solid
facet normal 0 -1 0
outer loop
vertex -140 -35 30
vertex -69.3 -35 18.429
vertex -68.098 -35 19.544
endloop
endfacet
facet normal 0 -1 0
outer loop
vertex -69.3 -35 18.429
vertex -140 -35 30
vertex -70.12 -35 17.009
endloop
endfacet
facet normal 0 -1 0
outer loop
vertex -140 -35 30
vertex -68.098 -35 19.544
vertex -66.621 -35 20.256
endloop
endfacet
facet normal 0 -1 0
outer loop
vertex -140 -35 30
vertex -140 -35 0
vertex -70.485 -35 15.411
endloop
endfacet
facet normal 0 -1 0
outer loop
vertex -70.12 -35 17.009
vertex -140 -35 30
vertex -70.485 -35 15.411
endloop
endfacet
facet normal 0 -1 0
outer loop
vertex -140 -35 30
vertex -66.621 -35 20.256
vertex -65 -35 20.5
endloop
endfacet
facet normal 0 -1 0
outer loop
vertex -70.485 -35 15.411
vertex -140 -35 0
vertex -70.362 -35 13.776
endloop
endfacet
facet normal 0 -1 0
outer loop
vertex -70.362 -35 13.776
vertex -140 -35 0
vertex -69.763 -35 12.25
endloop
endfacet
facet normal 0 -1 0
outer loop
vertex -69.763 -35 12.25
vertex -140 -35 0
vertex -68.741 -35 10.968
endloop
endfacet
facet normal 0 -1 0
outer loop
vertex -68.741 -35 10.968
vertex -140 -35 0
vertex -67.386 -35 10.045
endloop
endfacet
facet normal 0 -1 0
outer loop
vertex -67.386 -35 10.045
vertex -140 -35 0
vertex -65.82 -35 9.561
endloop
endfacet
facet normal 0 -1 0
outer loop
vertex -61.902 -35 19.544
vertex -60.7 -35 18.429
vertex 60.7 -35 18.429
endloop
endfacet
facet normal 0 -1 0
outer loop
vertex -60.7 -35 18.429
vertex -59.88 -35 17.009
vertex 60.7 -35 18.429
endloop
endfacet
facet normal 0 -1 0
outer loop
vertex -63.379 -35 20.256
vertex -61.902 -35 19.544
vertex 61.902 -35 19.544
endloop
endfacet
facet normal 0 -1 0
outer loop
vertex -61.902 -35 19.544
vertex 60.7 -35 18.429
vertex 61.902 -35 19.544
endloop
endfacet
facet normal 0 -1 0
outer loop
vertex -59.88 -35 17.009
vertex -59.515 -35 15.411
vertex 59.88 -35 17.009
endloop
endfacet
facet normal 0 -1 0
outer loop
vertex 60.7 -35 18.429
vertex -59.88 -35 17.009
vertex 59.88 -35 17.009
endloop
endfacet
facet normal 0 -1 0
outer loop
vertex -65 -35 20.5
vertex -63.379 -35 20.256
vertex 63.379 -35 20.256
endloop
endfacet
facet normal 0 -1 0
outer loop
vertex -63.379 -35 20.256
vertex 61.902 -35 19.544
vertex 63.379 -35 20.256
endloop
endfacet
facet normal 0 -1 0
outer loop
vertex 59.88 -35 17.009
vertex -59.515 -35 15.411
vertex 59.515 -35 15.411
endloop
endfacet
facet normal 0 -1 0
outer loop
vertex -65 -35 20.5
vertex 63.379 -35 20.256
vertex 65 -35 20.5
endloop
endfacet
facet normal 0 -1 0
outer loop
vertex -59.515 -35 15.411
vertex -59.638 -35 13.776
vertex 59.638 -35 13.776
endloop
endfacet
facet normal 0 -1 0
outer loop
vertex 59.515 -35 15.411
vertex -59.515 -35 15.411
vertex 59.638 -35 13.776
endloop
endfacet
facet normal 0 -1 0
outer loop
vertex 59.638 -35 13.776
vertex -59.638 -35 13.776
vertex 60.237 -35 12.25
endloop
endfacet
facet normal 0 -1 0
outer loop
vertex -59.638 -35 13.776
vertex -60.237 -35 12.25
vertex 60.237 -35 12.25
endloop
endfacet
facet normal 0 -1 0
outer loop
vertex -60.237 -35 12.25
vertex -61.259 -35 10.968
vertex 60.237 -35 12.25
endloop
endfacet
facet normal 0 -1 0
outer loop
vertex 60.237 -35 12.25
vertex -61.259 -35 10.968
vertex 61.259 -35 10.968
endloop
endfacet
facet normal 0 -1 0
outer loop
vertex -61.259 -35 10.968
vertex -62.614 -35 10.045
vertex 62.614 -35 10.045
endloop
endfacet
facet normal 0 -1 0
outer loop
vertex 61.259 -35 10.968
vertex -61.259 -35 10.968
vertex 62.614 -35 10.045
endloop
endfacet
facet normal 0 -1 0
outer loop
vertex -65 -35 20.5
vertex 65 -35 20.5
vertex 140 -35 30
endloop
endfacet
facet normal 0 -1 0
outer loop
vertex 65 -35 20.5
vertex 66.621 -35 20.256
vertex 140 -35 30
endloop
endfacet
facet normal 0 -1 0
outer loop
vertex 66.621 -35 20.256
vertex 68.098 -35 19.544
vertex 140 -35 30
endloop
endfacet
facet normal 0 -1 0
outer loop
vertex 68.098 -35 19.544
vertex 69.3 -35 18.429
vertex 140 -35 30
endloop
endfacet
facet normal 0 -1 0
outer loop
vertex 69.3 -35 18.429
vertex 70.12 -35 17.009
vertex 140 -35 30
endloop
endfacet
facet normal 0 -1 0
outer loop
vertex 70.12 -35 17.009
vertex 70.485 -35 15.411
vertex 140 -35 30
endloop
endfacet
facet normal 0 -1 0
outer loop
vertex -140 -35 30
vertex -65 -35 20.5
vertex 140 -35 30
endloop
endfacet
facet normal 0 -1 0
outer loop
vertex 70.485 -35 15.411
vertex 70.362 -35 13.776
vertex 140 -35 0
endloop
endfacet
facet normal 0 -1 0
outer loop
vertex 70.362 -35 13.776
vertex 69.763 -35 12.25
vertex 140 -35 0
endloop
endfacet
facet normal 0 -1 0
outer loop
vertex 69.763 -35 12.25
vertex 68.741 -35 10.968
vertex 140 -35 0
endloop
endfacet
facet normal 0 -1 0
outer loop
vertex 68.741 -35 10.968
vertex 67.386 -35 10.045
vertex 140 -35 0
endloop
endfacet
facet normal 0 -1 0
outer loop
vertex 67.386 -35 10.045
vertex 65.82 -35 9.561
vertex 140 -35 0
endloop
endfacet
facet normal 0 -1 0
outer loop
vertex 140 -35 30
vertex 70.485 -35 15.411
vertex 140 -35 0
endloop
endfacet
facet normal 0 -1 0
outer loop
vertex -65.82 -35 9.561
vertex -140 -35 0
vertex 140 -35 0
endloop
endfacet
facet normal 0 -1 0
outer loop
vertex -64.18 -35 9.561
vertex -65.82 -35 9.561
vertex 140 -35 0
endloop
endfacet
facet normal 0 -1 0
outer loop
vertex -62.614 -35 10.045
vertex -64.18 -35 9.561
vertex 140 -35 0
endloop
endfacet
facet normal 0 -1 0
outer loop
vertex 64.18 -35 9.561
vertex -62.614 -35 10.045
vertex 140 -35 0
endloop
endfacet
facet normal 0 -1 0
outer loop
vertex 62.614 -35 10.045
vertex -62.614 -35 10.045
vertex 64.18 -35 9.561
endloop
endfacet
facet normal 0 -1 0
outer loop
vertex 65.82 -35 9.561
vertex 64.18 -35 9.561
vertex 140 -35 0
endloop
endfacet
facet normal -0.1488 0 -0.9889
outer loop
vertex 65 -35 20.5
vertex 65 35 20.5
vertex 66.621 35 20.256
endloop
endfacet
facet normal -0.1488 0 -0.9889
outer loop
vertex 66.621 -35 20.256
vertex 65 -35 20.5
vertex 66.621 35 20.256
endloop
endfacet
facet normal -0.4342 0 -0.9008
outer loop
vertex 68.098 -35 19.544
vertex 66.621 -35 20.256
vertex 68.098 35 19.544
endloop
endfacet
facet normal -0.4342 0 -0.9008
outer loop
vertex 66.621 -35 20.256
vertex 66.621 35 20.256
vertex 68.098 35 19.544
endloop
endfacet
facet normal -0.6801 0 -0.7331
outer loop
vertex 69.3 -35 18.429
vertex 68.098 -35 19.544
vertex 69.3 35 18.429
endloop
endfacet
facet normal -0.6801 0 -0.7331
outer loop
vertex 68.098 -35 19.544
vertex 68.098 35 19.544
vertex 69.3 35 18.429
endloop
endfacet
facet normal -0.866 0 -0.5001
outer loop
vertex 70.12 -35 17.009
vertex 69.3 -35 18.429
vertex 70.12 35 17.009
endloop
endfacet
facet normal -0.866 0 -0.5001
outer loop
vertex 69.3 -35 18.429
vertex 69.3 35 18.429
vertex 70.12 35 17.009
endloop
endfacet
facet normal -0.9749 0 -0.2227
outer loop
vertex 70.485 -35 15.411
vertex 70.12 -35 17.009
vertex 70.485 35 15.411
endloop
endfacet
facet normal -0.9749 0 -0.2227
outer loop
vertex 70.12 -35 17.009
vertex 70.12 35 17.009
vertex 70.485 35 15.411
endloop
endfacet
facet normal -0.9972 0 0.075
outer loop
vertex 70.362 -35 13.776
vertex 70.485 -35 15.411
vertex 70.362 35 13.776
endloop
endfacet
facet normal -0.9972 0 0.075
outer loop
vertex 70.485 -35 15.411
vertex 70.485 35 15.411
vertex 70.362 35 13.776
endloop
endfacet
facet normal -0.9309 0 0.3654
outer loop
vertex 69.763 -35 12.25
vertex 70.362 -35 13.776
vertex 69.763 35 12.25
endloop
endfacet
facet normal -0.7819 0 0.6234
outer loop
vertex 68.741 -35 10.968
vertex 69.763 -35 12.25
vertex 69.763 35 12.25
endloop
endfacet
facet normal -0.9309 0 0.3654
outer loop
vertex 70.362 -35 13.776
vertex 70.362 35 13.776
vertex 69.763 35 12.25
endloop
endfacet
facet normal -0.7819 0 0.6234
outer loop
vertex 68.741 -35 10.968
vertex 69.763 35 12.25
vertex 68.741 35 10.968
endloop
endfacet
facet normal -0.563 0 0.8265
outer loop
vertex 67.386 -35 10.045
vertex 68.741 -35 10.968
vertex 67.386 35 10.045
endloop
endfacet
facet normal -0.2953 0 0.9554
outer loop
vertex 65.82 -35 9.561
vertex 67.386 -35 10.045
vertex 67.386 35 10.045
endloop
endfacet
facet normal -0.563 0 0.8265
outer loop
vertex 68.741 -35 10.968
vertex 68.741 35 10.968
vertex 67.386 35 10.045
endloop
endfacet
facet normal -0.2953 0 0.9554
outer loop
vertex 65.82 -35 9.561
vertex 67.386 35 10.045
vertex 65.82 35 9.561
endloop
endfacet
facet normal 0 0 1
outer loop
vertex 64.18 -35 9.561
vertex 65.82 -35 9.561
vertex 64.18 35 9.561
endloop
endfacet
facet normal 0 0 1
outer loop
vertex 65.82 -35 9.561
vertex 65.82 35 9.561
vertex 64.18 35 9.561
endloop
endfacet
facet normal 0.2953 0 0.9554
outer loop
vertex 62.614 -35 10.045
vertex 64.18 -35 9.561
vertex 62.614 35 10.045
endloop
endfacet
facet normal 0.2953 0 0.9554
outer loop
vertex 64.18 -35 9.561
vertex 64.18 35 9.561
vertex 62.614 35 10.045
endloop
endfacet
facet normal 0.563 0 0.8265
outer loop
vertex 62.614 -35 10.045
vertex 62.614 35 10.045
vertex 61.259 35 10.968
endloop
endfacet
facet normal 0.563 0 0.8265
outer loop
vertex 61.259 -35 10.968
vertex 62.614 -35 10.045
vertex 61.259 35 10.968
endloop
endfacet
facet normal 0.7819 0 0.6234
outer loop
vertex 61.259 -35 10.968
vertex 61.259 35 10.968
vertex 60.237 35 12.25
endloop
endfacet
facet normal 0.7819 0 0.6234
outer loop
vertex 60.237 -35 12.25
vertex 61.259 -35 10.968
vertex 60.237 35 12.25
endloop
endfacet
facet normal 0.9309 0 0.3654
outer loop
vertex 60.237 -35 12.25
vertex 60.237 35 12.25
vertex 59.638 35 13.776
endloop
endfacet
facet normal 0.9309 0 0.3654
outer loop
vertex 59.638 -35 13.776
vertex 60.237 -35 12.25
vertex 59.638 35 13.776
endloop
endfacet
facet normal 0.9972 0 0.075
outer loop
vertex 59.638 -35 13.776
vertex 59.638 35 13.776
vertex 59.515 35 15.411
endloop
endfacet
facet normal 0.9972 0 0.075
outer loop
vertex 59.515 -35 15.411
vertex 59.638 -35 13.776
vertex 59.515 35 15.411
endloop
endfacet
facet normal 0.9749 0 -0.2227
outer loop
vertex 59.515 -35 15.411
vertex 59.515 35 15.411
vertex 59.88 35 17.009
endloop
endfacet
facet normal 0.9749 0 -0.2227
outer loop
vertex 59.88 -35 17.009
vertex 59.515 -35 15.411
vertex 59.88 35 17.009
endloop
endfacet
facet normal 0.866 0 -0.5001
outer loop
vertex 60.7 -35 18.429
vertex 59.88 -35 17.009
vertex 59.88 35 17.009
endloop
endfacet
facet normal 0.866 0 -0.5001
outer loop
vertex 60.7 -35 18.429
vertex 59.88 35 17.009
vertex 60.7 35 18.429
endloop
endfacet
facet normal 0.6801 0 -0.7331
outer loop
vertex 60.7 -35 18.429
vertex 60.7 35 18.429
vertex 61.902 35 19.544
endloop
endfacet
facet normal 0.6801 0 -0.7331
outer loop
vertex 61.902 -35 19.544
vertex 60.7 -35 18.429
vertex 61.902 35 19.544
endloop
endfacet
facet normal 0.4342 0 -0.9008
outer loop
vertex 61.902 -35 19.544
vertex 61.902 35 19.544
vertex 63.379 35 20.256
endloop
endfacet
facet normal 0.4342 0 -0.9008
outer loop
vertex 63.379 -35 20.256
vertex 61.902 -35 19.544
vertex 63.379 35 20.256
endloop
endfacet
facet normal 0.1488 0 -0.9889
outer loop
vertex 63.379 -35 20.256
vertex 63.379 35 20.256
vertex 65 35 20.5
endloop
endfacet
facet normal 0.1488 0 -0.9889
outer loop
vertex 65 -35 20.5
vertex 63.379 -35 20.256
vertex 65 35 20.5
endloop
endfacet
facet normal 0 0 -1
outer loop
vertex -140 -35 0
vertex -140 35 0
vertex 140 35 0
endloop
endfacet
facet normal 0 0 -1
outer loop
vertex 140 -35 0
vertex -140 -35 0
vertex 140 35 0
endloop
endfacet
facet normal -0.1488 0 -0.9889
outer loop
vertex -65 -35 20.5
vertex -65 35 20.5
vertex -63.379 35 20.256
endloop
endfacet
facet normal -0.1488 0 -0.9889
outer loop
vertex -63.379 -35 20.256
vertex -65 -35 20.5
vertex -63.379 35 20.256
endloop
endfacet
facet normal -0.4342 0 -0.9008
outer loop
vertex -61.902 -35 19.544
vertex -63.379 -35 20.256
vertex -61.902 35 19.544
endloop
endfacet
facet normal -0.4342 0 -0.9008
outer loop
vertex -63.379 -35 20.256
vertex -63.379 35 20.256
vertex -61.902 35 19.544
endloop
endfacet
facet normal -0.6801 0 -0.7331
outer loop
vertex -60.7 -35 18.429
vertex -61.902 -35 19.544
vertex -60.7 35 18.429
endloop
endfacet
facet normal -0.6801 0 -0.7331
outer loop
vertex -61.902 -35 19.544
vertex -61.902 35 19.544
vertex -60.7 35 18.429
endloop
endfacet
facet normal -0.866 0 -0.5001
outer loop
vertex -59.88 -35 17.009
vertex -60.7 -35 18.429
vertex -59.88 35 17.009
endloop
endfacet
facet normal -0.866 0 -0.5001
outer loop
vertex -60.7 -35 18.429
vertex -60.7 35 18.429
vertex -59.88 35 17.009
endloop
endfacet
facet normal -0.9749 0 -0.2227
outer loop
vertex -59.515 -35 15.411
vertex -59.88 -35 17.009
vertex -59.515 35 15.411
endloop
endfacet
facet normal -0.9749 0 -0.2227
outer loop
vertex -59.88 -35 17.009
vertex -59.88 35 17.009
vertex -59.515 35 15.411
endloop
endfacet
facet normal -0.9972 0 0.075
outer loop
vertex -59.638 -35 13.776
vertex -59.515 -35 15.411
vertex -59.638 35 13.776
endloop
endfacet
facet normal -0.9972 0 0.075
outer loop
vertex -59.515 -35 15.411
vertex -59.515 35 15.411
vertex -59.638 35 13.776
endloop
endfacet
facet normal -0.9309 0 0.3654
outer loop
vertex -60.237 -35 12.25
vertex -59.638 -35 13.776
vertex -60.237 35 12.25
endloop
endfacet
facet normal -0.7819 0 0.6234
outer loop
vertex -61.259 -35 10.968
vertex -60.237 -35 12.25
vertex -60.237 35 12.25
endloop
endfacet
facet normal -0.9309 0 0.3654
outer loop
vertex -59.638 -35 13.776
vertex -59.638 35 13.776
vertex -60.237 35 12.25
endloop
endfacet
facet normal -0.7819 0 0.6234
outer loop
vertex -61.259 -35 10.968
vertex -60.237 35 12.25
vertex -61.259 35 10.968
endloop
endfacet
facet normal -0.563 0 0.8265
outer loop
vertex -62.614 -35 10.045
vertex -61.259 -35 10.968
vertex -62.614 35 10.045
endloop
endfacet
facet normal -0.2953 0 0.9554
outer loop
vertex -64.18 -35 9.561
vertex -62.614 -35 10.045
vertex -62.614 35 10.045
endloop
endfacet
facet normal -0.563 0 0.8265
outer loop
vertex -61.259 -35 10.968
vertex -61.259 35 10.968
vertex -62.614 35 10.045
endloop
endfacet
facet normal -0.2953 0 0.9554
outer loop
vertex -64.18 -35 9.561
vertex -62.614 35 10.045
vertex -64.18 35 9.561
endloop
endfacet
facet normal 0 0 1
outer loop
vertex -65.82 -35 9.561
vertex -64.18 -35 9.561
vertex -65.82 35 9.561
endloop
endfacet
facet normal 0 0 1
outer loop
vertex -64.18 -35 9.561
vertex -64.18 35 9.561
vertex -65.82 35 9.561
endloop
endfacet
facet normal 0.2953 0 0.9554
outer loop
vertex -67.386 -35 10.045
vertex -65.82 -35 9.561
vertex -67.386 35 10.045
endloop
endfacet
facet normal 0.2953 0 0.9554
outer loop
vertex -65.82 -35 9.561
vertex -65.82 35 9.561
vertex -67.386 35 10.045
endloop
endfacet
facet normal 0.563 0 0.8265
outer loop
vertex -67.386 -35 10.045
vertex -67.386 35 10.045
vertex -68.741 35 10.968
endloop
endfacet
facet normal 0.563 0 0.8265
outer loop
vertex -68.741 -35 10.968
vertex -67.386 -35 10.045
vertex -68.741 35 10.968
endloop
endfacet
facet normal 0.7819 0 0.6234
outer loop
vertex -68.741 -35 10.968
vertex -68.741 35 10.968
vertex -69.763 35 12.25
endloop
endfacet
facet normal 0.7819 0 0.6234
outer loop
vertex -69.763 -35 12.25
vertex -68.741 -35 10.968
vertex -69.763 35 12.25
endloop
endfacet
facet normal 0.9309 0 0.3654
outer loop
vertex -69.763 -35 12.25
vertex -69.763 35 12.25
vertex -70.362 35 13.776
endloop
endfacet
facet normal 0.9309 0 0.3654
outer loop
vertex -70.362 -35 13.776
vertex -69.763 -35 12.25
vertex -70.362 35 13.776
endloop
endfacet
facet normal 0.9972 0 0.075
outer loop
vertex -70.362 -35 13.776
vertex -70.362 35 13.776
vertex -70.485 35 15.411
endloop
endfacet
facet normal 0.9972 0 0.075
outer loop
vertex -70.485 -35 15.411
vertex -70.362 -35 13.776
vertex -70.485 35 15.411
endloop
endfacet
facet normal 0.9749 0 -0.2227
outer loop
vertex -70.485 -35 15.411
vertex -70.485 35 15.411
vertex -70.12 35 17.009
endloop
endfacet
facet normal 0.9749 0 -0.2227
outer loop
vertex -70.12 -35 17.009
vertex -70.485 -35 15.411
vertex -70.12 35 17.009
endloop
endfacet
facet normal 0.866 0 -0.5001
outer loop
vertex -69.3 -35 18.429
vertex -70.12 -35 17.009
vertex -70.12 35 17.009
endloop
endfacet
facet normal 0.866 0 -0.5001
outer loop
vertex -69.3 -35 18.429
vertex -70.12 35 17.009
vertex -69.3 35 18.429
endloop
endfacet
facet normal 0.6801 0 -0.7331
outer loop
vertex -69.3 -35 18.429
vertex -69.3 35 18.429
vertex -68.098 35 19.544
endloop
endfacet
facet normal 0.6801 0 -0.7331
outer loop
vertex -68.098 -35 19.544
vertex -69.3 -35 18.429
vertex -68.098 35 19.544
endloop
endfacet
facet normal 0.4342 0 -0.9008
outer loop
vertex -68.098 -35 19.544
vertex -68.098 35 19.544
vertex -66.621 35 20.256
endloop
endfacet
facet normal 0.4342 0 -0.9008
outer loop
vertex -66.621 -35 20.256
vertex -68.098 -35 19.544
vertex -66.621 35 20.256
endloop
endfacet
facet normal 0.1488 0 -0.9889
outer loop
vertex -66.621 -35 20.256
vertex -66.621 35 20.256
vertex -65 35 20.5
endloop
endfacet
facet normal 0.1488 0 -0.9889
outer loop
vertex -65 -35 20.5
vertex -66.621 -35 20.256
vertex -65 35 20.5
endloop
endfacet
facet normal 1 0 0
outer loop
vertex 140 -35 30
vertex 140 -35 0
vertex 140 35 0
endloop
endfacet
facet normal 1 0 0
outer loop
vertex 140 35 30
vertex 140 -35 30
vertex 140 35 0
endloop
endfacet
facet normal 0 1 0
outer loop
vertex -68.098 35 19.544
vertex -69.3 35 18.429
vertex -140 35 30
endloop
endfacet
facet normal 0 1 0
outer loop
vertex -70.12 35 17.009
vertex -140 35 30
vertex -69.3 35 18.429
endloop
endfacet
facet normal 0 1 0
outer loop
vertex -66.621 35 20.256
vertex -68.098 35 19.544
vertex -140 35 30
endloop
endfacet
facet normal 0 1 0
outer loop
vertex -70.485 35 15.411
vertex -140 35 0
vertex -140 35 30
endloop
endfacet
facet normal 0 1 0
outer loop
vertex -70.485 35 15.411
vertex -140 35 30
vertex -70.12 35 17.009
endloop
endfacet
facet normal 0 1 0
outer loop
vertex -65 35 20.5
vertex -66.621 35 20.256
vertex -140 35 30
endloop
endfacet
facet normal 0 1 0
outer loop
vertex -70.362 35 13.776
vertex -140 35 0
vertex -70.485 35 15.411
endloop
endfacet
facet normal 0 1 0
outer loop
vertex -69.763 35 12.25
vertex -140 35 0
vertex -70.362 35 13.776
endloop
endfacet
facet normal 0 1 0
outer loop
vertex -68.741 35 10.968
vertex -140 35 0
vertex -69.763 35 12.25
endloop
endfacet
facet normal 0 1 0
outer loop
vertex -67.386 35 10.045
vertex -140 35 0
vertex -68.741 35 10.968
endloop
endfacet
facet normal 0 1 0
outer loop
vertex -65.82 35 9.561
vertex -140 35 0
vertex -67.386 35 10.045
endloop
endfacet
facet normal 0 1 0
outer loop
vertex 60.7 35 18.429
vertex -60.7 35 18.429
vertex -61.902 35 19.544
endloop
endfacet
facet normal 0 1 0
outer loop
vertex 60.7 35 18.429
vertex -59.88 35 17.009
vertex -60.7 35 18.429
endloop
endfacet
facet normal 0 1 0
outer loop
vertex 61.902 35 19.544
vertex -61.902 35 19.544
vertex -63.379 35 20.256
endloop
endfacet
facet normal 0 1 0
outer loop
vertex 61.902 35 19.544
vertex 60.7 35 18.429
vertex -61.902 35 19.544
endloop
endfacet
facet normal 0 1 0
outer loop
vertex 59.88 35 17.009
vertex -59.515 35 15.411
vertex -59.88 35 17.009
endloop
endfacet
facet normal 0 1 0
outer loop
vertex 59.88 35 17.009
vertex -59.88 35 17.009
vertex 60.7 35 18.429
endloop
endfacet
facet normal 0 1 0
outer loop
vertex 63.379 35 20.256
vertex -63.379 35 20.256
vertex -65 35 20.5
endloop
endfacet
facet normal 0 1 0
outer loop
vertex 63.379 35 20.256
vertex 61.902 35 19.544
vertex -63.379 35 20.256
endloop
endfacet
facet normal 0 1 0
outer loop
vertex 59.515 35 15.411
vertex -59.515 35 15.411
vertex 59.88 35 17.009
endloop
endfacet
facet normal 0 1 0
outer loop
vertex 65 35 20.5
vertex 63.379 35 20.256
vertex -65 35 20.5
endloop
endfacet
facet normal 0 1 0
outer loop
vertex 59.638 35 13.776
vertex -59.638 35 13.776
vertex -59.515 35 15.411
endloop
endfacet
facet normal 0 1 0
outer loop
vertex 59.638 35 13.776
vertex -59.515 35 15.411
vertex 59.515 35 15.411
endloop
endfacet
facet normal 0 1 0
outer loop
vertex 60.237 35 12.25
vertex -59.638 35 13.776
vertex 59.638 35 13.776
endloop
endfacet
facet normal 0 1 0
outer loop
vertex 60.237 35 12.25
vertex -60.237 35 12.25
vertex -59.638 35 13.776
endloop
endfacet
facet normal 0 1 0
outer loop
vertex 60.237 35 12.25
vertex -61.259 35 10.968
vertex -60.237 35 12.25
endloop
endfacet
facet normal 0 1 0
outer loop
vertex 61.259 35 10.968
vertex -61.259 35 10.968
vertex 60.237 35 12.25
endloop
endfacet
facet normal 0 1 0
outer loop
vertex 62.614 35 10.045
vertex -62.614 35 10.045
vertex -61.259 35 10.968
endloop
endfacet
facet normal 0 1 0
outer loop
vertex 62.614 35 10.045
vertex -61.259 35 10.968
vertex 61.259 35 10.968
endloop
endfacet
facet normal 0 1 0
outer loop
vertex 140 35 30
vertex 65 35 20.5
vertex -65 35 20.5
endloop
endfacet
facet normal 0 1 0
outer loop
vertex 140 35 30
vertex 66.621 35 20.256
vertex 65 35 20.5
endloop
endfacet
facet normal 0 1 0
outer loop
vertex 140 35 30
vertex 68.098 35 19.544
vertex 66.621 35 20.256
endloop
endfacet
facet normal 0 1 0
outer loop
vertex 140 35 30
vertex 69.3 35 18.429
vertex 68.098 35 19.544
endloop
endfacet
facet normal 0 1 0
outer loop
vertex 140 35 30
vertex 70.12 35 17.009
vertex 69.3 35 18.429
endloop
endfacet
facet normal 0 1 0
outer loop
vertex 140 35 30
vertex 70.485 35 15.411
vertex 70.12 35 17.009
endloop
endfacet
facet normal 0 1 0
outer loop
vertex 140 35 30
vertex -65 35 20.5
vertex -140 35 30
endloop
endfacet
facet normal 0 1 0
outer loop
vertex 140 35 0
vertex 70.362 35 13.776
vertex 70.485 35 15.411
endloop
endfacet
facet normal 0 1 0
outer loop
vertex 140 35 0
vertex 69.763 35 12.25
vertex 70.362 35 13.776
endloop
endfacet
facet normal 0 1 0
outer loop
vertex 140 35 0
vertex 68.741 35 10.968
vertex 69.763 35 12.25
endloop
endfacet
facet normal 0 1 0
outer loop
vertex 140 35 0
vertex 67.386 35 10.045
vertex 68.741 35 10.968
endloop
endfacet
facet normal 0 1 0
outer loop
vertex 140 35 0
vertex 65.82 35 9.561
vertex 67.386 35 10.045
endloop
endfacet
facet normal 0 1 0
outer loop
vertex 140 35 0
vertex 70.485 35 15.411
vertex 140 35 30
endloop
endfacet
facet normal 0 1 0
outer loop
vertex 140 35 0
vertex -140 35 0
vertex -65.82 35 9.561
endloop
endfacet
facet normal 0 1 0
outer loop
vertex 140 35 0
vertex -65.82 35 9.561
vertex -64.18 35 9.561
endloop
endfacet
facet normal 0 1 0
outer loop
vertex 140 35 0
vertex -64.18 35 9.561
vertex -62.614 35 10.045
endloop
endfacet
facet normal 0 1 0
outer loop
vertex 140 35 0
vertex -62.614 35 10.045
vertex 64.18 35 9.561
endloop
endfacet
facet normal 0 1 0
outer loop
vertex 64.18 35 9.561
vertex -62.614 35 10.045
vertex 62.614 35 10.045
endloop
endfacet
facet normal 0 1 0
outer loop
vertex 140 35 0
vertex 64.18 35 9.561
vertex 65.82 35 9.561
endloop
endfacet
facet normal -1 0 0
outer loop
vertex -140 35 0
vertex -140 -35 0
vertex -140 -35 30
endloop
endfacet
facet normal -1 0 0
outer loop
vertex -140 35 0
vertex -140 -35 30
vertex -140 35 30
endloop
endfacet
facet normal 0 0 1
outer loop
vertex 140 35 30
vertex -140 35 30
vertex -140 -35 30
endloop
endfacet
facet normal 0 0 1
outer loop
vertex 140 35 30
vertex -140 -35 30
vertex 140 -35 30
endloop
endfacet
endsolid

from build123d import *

# Parameters (mm, degrees)
SKETCH1_W           = 280
SKETCH1_H           = 70
BOSS_EXTRUDE1_DEPTH = 30
SKETCH2_R           = 5.5
CUT_EXTRUDE1_DEPTH  = 80


with BuildPart() as part:
    # Sketch1 → Boss-Extrude1 (new body)
    with BuildSketch(Plane.XY):
        Rectangle(SKETCH1_W, SKETCH1_H)
    extrude(amount=BOSS_EXTRUDE1_DEPTH)

    # Sketch2 → Cut-Extrude1 (cut)
    with BuildSketch(Plane(origin=(0, 35, 0), x_dir=(1, 0, 0), z_dir=(0, 1, 0))):
        with Locations(Location((-65, -15, 0), (0, 0, 270))):
            Circle(SKETCH2_R)
        with Locations(Location((65, -15, 0), (0, 0, 270))):
            Circle(SKETCH2_R)
    extrude(amount=-CUT_EXTRUDE1_DEPTH, mode=Mode.SUBTRACT)


solid = part.part
